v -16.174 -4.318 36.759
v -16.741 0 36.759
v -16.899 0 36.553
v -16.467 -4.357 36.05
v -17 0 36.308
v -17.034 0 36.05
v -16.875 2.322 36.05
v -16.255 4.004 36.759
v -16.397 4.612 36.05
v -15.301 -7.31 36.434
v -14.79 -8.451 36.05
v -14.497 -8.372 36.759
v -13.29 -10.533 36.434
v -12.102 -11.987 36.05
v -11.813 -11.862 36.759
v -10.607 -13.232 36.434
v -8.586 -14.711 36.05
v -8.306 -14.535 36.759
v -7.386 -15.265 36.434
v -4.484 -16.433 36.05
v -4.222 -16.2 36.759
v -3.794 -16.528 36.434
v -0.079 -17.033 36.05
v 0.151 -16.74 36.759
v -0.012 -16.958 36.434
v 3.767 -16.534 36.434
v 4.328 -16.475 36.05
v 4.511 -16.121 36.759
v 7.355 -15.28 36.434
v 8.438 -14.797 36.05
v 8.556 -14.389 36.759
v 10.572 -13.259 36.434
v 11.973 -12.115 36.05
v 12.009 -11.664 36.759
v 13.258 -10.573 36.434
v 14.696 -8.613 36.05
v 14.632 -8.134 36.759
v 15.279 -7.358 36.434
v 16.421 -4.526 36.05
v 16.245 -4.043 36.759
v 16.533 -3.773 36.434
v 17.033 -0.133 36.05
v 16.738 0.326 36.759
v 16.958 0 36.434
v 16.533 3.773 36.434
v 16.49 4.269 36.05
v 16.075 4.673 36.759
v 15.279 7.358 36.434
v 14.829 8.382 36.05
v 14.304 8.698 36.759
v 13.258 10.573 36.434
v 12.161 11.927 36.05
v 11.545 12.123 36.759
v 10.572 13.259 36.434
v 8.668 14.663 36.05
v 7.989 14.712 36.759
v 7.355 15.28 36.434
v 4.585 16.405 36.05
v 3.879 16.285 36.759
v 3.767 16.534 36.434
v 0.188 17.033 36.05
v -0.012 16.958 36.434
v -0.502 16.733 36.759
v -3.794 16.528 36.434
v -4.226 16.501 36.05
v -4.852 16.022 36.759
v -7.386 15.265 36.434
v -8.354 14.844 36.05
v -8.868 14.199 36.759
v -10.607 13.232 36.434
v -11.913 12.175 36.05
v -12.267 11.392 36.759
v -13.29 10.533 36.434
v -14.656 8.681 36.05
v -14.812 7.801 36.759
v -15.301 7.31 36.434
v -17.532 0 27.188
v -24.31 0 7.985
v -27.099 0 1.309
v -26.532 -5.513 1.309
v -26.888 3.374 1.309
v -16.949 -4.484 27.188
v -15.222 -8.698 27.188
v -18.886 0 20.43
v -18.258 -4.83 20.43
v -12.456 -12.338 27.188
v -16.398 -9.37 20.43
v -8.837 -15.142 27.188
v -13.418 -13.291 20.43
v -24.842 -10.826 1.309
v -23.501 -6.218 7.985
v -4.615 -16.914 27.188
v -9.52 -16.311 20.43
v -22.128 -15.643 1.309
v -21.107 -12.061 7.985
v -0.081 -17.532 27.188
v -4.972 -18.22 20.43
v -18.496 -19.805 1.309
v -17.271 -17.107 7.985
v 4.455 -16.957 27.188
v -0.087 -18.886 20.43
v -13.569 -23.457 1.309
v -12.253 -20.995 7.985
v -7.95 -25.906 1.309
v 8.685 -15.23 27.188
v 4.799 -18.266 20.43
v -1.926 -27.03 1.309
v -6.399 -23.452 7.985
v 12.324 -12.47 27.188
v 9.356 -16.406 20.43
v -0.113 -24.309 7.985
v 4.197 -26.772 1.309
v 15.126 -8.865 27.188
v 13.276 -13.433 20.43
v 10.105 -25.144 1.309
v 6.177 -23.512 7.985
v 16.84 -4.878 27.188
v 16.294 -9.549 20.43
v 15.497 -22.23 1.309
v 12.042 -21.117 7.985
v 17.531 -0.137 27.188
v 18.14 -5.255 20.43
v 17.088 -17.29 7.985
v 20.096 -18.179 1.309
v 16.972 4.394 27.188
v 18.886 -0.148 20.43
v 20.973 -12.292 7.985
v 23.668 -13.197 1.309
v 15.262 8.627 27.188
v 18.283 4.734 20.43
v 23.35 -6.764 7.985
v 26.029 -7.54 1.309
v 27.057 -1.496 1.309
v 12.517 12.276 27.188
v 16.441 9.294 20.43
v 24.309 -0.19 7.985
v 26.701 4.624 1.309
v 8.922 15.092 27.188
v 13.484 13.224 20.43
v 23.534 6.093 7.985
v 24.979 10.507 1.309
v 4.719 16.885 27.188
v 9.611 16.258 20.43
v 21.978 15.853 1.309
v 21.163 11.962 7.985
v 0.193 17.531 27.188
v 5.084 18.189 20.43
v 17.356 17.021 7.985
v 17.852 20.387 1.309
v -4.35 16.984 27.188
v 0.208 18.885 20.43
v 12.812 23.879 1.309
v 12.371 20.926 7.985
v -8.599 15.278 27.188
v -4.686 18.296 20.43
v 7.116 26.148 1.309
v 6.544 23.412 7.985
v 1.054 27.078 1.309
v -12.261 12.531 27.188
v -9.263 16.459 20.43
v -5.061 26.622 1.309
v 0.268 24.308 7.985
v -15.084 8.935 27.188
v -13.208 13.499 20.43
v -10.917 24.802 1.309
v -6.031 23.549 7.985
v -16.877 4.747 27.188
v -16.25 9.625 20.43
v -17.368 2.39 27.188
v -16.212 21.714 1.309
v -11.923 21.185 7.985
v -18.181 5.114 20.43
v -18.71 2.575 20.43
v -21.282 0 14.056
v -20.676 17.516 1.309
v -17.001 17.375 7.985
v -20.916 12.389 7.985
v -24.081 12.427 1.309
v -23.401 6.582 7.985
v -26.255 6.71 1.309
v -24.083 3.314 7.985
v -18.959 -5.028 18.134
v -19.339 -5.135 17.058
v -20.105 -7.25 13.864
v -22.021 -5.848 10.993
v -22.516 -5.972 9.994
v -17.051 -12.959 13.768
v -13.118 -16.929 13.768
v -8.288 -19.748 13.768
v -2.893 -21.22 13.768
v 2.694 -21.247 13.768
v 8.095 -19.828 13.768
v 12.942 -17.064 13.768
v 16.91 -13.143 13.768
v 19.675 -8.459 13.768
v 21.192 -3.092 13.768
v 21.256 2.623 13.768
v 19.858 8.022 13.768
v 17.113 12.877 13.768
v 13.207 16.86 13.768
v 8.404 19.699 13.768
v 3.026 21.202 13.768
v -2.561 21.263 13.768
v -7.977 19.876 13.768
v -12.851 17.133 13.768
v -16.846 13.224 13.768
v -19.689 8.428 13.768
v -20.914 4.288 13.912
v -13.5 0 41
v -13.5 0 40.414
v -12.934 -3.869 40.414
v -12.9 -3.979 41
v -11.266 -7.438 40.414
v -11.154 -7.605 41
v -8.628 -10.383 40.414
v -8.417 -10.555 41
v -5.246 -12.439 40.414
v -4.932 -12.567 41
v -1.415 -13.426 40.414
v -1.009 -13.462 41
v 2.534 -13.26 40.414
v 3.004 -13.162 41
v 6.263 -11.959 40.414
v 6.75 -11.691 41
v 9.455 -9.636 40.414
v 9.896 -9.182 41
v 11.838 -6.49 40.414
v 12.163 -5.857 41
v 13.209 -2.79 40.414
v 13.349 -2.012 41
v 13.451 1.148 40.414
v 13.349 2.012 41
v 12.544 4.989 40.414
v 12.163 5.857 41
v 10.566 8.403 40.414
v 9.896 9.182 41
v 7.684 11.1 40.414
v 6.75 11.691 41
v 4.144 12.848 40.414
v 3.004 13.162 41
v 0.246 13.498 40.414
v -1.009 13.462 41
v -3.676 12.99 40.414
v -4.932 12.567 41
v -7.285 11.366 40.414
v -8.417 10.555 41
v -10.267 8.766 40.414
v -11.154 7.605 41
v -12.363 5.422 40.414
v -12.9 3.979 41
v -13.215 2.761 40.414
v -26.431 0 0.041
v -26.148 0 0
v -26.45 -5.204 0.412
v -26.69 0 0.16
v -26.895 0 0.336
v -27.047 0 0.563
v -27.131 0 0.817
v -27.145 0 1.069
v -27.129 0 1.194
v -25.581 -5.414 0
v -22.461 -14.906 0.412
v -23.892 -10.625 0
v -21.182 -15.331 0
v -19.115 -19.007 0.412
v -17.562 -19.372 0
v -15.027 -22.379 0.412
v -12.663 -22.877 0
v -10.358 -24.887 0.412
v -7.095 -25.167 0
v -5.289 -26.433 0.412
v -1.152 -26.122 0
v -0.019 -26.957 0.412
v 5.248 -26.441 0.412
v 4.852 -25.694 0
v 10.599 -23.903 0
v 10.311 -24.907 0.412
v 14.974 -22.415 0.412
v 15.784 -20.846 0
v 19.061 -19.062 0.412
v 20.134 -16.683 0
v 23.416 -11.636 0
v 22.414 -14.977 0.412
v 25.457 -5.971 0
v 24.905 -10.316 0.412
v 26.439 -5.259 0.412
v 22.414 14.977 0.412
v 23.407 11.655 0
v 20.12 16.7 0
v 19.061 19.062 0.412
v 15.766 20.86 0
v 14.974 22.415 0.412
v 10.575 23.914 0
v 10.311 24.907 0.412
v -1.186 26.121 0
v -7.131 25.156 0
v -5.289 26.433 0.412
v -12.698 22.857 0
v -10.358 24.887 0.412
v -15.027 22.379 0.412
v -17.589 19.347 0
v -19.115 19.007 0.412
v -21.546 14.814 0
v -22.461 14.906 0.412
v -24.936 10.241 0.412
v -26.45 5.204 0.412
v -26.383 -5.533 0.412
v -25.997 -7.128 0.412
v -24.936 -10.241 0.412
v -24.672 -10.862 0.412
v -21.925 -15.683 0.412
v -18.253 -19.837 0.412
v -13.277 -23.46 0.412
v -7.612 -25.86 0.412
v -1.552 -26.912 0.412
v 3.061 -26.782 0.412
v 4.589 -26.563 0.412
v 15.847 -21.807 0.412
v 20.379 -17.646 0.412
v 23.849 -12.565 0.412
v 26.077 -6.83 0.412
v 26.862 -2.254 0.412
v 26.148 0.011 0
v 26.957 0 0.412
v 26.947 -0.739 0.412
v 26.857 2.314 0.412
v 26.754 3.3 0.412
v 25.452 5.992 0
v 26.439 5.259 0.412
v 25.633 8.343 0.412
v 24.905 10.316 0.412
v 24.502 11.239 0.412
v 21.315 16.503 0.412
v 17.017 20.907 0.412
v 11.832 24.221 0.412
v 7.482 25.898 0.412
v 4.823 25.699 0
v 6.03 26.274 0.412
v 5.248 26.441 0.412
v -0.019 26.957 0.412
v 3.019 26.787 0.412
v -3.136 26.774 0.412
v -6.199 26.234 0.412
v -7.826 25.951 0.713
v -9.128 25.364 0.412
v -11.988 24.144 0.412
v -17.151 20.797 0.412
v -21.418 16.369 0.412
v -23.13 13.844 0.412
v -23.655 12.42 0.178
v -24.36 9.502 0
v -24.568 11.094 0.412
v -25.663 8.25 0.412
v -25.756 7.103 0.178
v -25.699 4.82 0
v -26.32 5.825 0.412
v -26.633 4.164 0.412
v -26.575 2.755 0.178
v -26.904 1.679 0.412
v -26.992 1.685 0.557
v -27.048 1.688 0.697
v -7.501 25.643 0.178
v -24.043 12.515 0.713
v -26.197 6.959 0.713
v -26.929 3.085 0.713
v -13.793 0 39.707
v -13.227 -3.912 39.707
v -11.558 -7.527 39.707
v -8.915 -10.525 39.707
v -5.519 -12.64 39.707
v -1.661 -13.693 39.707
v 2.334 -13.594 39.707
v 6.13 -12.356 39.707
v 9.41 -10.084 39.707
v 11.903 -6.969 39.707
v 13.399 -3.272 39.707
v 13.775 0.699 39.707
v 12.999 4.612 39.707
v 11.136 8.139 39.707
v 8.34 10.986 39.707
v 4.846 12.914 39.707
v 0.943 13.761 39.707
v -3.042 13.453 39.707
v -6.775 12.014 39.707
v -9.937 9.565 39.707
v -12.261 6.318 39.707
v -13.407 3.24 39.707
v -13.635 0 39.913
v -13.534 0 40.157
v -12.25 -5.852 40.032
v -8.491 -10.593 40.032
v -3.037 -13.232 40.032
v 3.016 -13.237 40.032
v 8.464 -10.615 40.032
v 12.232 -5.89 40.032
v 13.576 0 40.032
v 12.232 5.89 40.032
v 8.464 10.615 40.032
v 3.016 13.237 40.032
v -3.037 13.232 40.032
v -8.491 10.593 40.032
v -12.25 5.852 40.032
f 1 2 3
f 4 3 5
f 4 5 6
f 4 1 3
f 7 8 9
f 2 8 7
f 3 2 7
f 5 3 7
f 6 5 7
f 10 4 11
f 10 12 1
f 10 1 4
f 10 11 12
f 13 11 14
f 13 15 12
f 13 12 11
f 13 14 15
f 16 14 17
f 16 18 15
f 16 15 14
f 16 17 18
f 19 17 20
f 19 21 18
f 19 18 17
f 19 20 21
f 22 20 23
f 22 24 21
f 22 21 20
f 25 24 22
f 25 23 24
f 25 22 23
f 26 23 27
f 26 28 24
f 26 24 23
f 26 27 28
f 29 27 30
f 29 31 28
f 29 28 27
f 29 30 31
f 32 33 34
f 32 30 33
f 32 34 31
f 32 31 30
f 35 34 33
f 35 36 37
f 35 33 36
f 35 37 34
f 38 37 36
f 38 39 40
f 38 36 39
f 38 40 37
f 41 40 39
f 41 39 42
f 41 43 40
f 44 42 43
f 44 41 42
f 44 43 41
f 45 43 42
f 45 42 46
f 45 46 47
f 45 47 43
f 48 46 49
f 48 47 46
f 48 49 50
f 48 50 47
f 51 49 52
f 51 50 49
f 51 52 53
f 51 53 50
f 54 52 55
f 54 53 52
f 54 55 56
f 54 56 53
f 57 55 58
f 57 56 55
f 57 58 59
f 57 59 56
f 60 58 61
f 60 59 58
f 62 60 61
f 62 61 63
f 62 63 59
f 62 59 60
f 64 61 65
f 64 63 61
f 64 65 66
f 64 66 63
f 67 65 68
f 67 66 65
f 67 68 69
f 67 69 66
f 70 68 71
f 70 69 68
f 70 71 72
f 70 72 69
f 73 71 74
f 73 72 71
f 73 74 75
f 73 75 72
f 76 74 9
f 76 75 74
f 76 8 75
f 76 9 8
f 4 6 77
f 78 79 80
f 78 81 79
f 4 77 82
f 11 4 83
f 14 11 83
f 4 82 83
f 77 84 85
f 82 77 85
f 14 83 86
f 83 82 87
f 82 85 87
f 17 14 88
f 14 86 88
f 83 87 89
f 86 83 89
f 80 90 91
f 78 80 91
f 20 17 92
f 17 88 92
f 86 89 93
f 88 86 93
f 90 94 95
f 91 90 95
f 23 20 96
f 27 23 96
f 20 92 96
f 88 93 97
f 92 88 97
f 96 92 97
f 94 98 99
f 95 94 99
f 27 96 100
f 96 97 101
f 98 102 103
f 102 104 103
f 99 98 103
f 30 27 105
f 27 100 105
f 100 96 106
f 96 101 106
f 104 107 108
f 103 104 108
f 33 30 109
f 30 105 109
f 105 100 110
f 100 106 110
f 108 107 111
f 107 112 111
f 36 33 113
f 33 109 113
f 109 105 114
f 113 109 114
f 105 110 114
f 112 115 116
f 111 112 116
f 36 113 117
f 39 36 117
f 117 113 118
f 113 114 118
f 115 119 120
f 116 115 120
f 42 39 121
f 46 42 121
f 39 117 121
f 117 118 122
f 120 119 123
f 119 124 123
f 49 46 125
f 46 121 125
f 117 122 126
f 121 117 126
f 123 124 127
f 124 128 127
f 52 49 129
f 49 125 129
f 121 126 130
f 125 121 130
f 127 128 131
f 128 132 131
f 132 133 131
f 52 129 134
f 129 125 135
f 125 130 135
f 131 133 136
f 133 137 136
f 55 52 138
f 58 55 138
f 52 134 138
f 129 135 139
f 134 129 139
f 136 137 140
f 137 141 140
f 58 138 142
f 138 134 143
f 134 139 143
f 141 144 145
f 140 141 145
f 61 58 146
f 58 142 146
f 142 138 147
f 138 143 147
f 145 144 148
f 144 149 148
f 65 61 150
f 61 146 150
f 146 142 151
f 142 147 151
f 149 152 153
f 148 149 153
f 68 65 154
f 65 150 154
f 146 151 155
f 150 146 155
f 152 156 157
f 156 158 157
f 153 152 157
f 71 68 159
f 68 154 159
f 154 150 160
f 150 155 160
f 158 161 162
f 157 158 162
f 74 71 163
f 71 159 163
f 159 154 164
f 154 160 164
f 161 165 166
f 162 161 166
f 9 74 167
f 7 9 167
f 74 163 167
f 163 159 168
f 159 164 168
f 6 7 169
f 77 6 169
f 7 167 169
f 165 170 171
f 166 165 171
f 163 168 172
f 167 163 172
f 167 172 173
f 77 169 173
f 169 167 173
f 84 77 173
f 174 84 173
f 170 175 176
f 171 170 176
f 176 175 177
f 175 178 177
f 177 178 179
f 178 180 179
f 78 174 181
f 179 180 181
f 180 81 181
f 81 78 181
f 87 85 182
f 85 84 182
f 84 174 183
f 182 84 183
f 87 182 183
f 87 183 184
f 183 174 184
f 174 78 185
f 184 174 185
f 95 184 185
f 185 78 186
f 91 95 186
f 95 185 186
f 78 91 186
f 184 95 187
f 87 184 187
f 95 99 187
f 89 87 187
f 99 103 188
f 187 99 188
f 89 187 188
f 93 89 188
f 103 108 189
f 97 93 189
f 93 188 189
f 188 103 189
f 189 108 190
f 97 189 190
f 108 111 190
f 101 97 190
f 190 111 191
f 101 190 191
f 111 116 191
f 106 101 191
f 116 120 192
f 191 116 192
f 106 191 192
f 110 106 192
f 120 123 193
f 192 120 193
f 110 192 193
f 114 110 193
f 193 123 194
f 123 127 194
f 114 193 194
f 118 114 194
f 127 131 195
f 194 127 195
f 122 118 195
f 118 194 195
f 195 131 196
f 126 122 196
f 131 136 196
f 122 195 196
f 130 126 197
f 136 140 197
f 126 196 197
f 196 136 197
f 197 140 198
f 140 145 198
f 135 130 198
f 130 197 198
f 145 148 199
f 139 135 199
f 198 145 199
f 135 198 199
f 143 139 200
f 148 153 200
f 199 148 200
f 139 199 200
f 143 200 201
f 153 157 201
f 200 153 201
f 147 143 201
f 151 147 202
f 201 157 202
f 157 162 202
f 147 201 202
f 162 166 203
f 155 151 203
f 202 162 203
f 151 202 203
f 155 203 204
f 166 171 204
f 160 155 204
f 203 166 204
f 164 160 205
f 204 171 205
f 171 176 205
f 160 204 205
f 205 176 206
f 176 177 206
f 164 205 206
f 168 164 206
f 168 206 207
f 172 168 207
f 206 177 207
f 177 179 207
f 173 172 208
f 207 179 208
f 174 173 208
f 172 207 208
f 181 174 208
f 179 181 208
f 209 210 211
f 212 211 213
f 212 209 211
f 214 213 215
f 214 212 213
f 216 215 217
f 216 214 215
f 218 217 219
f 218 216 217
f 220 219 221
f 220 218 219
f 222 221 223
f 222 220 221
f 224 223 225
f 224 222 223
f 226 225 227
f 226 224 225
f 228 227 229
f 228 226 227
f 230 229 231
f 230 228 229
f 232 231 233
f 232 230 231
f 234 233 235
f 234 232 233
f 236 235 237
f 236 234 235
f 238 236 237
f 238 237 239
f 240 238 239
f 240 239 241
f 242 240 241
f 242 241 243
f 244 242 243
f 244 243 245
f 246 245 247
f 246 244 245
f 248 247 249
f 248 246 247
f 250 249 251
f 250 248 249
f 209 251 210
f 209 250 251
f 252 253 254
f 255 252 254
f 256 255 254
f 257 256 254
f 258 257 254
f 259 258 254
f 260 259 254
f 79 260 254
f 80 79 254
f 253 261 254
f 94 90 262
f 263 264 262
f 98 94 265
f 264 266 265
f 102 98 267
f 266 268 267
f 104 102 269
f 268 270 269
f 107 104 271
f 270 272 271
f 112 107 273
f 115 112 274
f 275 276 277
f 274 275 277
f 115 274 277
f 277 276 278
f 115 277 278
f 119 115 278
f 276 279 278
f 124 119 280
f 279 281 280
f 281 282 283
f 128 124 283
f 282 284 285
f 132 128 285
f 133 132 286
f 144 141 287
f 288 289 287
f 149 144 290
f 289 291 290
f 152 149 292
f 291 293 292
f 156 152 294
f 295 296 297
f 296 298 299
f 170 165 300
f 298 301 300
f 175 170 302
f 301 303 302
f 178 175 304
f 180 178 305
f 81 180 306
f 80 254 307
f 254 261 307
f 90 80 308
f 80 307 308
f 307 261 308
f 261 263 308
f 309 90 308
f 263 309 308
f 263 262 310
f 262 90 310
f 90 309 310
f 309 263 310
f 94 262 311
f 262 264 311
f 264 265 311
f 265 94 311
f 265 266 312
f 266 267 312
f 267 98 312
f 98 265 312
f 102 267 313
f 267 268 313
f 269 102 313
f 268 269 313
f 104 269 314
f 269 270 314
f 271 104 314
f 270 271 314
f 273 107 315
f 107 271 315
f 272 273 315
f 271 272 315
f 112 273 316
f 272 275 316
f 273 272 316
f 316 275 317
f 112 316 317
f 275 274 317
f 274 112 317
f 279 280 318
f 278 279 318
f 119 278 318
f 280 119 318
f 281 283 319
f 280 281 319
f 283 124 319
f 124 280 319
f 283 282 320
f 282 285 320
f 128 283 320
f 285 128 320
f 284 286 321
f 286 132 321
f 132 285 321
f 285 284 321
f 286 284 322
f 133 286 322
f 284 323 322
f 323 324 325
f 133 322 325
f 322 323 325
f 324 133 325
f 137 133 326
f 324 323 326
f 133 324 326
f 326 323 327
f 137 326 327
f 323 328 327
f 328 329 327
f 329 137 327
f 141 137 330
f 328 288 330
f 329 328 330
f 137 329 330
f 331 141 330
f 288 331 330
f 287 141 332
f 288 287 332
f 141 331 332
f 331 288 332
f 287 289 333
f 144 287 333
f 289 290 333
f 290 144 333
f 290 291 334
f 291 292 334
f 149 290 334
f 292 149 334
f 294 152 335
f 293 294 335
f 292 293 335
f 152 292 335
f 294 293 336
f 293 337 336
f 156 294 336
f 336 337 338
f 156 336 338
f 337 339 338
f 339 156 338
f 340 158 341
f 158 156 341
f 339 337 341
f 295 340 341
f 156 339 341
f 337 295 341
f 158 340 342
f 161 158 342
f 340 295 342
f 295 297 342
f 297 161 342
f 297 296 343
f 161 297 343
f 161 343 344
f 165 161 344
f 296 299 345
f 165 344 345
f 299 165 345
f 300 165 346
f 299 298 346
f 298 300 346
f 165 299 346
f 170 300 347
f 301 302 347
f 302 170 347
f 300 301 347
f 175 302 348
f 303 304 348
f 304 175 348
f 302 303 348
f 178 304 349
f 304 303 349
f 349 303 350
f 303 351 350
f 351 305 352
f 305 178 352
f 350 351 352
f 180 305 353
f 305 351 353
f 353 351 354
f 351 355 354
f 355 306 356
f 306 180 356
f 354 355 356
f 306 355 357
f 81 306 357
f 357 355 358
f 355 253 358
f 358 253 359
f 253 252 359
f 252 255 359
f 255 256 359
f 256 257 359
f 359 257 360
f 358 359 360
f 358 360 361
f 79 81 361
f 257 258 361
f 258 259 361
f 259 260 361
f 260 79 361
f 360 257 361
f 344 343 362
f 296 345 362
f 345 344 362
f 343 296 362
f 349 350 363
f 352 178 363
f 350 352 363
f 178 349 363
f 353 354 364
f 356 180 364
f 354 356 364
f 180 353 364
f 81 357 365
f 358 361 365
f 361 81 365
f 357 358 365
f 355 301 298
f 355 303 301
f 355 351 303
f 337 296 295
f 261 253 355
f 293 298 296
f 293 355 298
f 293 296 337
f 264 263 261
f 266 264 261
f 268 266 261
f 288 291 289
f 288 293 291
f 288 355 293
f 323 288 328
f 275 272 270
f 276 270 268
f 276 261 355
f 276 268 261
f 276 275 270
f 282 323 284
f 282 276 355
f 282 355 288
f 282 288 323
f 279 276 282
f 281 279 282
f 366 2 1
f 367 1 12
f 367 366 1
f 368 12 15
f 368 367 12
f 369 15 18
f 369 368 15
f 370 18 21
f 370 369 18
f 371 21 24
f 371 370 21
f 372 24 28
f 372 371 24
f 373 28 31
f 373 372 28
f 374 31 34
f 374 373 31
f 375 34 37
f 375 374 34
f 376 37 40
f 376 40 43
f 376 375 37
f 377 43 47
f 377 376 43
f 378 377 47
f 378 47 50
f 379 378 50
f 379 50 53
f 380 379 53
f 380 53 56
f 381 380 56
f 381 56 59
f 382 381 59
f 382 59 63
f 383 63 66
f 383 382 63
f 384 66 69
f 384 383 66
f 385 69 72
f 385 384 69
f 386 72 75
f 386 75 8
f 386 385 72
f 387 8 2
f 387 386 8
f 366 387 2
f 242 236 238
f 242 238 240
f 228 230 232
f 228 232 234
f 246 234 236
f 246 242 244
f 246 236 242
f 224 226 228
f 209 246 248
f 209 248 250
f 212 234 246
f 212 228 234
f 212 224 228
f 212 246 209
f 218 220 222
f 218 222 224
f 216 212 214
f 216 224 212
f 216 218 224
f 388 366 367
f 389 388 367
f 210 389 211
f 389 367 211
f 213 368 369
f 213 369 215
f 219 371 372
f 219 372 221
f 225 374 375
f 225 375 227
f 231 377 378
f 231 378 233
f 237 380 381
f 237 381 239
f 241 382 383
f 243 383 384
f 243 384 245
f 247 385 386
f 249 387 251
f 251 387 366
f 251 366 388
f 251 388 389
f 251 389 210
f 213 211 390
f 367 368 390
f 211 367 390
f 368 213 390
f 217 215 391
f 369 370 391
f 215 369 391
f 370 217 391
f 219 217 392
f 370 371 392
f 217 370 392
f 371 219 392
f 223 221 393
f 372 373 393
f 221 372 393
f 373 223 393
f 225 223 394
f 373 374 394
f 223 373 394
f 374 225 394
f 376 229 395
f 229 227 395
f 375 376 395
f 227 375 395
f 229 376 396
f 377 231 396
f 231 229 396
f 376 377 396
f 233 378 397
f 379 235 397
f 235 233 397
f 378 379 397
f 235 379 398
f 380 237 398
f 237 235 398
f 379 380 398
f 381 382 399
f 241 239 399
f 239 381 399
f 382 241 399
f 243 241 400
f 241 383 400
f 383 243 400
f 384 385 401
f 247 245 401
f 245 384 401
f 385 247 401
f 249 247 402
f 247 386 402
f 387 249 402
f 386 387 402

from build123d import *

# Parameters (mm, degrees)
FILLET001_R = 1
FILLET002_R = 1
FILLET003_R = 1


with BuildPart() as part:
    # Sketch → Revolution (revolve)
    with BuildSketch(Plane.XZ):
        with BuildLine():
            Line((0, 41), (0, 0))
            Line((0, 0), (-27.5, 0))
            add(Edge.make_bspline(
                [(-17.035534, 36.464466), (-16.894249, 15.411525), (-23.994074, 12.167703), (-27.5, 0)],
                knots=[0, 0, 0, 0, 37.936315, 37.936315, 37.936315, 37.936315], degree=3))
            Line((-17.035534, 36.464466), (-13.5, 40))
            Line((-13.5, 40), (-13.5, 41))
            Line((-13.5, 41), (0, 41))
        make_face()
    revolve(axis=Axis((0, 0, 0), (0, 0, 1)))

    # Fillet001
    fillet001_edges = [part.edges().sort_by_distance(p)[0] for p in [
        (27.5, 0, 0),
    ]]
    fillet(fillet001_edges, radius=FILLET001_R)

    # Fillet002
    fillet002_edges = [part.edges().sort_by_distance(p)[0] for p in [
        (13.5, 0, 40),
    ]]
    fillet(fillet002_edges, radius=FILLET002_R)

    # Fillet003
    fillet003_edges = [part.edges().sort_by_distance(p)[0] for p in [
        (17.035534, 0, 36.464466),
    ]]
    fillet(fillet003_edges, radius=FILLET003_R)


solid = part.part
